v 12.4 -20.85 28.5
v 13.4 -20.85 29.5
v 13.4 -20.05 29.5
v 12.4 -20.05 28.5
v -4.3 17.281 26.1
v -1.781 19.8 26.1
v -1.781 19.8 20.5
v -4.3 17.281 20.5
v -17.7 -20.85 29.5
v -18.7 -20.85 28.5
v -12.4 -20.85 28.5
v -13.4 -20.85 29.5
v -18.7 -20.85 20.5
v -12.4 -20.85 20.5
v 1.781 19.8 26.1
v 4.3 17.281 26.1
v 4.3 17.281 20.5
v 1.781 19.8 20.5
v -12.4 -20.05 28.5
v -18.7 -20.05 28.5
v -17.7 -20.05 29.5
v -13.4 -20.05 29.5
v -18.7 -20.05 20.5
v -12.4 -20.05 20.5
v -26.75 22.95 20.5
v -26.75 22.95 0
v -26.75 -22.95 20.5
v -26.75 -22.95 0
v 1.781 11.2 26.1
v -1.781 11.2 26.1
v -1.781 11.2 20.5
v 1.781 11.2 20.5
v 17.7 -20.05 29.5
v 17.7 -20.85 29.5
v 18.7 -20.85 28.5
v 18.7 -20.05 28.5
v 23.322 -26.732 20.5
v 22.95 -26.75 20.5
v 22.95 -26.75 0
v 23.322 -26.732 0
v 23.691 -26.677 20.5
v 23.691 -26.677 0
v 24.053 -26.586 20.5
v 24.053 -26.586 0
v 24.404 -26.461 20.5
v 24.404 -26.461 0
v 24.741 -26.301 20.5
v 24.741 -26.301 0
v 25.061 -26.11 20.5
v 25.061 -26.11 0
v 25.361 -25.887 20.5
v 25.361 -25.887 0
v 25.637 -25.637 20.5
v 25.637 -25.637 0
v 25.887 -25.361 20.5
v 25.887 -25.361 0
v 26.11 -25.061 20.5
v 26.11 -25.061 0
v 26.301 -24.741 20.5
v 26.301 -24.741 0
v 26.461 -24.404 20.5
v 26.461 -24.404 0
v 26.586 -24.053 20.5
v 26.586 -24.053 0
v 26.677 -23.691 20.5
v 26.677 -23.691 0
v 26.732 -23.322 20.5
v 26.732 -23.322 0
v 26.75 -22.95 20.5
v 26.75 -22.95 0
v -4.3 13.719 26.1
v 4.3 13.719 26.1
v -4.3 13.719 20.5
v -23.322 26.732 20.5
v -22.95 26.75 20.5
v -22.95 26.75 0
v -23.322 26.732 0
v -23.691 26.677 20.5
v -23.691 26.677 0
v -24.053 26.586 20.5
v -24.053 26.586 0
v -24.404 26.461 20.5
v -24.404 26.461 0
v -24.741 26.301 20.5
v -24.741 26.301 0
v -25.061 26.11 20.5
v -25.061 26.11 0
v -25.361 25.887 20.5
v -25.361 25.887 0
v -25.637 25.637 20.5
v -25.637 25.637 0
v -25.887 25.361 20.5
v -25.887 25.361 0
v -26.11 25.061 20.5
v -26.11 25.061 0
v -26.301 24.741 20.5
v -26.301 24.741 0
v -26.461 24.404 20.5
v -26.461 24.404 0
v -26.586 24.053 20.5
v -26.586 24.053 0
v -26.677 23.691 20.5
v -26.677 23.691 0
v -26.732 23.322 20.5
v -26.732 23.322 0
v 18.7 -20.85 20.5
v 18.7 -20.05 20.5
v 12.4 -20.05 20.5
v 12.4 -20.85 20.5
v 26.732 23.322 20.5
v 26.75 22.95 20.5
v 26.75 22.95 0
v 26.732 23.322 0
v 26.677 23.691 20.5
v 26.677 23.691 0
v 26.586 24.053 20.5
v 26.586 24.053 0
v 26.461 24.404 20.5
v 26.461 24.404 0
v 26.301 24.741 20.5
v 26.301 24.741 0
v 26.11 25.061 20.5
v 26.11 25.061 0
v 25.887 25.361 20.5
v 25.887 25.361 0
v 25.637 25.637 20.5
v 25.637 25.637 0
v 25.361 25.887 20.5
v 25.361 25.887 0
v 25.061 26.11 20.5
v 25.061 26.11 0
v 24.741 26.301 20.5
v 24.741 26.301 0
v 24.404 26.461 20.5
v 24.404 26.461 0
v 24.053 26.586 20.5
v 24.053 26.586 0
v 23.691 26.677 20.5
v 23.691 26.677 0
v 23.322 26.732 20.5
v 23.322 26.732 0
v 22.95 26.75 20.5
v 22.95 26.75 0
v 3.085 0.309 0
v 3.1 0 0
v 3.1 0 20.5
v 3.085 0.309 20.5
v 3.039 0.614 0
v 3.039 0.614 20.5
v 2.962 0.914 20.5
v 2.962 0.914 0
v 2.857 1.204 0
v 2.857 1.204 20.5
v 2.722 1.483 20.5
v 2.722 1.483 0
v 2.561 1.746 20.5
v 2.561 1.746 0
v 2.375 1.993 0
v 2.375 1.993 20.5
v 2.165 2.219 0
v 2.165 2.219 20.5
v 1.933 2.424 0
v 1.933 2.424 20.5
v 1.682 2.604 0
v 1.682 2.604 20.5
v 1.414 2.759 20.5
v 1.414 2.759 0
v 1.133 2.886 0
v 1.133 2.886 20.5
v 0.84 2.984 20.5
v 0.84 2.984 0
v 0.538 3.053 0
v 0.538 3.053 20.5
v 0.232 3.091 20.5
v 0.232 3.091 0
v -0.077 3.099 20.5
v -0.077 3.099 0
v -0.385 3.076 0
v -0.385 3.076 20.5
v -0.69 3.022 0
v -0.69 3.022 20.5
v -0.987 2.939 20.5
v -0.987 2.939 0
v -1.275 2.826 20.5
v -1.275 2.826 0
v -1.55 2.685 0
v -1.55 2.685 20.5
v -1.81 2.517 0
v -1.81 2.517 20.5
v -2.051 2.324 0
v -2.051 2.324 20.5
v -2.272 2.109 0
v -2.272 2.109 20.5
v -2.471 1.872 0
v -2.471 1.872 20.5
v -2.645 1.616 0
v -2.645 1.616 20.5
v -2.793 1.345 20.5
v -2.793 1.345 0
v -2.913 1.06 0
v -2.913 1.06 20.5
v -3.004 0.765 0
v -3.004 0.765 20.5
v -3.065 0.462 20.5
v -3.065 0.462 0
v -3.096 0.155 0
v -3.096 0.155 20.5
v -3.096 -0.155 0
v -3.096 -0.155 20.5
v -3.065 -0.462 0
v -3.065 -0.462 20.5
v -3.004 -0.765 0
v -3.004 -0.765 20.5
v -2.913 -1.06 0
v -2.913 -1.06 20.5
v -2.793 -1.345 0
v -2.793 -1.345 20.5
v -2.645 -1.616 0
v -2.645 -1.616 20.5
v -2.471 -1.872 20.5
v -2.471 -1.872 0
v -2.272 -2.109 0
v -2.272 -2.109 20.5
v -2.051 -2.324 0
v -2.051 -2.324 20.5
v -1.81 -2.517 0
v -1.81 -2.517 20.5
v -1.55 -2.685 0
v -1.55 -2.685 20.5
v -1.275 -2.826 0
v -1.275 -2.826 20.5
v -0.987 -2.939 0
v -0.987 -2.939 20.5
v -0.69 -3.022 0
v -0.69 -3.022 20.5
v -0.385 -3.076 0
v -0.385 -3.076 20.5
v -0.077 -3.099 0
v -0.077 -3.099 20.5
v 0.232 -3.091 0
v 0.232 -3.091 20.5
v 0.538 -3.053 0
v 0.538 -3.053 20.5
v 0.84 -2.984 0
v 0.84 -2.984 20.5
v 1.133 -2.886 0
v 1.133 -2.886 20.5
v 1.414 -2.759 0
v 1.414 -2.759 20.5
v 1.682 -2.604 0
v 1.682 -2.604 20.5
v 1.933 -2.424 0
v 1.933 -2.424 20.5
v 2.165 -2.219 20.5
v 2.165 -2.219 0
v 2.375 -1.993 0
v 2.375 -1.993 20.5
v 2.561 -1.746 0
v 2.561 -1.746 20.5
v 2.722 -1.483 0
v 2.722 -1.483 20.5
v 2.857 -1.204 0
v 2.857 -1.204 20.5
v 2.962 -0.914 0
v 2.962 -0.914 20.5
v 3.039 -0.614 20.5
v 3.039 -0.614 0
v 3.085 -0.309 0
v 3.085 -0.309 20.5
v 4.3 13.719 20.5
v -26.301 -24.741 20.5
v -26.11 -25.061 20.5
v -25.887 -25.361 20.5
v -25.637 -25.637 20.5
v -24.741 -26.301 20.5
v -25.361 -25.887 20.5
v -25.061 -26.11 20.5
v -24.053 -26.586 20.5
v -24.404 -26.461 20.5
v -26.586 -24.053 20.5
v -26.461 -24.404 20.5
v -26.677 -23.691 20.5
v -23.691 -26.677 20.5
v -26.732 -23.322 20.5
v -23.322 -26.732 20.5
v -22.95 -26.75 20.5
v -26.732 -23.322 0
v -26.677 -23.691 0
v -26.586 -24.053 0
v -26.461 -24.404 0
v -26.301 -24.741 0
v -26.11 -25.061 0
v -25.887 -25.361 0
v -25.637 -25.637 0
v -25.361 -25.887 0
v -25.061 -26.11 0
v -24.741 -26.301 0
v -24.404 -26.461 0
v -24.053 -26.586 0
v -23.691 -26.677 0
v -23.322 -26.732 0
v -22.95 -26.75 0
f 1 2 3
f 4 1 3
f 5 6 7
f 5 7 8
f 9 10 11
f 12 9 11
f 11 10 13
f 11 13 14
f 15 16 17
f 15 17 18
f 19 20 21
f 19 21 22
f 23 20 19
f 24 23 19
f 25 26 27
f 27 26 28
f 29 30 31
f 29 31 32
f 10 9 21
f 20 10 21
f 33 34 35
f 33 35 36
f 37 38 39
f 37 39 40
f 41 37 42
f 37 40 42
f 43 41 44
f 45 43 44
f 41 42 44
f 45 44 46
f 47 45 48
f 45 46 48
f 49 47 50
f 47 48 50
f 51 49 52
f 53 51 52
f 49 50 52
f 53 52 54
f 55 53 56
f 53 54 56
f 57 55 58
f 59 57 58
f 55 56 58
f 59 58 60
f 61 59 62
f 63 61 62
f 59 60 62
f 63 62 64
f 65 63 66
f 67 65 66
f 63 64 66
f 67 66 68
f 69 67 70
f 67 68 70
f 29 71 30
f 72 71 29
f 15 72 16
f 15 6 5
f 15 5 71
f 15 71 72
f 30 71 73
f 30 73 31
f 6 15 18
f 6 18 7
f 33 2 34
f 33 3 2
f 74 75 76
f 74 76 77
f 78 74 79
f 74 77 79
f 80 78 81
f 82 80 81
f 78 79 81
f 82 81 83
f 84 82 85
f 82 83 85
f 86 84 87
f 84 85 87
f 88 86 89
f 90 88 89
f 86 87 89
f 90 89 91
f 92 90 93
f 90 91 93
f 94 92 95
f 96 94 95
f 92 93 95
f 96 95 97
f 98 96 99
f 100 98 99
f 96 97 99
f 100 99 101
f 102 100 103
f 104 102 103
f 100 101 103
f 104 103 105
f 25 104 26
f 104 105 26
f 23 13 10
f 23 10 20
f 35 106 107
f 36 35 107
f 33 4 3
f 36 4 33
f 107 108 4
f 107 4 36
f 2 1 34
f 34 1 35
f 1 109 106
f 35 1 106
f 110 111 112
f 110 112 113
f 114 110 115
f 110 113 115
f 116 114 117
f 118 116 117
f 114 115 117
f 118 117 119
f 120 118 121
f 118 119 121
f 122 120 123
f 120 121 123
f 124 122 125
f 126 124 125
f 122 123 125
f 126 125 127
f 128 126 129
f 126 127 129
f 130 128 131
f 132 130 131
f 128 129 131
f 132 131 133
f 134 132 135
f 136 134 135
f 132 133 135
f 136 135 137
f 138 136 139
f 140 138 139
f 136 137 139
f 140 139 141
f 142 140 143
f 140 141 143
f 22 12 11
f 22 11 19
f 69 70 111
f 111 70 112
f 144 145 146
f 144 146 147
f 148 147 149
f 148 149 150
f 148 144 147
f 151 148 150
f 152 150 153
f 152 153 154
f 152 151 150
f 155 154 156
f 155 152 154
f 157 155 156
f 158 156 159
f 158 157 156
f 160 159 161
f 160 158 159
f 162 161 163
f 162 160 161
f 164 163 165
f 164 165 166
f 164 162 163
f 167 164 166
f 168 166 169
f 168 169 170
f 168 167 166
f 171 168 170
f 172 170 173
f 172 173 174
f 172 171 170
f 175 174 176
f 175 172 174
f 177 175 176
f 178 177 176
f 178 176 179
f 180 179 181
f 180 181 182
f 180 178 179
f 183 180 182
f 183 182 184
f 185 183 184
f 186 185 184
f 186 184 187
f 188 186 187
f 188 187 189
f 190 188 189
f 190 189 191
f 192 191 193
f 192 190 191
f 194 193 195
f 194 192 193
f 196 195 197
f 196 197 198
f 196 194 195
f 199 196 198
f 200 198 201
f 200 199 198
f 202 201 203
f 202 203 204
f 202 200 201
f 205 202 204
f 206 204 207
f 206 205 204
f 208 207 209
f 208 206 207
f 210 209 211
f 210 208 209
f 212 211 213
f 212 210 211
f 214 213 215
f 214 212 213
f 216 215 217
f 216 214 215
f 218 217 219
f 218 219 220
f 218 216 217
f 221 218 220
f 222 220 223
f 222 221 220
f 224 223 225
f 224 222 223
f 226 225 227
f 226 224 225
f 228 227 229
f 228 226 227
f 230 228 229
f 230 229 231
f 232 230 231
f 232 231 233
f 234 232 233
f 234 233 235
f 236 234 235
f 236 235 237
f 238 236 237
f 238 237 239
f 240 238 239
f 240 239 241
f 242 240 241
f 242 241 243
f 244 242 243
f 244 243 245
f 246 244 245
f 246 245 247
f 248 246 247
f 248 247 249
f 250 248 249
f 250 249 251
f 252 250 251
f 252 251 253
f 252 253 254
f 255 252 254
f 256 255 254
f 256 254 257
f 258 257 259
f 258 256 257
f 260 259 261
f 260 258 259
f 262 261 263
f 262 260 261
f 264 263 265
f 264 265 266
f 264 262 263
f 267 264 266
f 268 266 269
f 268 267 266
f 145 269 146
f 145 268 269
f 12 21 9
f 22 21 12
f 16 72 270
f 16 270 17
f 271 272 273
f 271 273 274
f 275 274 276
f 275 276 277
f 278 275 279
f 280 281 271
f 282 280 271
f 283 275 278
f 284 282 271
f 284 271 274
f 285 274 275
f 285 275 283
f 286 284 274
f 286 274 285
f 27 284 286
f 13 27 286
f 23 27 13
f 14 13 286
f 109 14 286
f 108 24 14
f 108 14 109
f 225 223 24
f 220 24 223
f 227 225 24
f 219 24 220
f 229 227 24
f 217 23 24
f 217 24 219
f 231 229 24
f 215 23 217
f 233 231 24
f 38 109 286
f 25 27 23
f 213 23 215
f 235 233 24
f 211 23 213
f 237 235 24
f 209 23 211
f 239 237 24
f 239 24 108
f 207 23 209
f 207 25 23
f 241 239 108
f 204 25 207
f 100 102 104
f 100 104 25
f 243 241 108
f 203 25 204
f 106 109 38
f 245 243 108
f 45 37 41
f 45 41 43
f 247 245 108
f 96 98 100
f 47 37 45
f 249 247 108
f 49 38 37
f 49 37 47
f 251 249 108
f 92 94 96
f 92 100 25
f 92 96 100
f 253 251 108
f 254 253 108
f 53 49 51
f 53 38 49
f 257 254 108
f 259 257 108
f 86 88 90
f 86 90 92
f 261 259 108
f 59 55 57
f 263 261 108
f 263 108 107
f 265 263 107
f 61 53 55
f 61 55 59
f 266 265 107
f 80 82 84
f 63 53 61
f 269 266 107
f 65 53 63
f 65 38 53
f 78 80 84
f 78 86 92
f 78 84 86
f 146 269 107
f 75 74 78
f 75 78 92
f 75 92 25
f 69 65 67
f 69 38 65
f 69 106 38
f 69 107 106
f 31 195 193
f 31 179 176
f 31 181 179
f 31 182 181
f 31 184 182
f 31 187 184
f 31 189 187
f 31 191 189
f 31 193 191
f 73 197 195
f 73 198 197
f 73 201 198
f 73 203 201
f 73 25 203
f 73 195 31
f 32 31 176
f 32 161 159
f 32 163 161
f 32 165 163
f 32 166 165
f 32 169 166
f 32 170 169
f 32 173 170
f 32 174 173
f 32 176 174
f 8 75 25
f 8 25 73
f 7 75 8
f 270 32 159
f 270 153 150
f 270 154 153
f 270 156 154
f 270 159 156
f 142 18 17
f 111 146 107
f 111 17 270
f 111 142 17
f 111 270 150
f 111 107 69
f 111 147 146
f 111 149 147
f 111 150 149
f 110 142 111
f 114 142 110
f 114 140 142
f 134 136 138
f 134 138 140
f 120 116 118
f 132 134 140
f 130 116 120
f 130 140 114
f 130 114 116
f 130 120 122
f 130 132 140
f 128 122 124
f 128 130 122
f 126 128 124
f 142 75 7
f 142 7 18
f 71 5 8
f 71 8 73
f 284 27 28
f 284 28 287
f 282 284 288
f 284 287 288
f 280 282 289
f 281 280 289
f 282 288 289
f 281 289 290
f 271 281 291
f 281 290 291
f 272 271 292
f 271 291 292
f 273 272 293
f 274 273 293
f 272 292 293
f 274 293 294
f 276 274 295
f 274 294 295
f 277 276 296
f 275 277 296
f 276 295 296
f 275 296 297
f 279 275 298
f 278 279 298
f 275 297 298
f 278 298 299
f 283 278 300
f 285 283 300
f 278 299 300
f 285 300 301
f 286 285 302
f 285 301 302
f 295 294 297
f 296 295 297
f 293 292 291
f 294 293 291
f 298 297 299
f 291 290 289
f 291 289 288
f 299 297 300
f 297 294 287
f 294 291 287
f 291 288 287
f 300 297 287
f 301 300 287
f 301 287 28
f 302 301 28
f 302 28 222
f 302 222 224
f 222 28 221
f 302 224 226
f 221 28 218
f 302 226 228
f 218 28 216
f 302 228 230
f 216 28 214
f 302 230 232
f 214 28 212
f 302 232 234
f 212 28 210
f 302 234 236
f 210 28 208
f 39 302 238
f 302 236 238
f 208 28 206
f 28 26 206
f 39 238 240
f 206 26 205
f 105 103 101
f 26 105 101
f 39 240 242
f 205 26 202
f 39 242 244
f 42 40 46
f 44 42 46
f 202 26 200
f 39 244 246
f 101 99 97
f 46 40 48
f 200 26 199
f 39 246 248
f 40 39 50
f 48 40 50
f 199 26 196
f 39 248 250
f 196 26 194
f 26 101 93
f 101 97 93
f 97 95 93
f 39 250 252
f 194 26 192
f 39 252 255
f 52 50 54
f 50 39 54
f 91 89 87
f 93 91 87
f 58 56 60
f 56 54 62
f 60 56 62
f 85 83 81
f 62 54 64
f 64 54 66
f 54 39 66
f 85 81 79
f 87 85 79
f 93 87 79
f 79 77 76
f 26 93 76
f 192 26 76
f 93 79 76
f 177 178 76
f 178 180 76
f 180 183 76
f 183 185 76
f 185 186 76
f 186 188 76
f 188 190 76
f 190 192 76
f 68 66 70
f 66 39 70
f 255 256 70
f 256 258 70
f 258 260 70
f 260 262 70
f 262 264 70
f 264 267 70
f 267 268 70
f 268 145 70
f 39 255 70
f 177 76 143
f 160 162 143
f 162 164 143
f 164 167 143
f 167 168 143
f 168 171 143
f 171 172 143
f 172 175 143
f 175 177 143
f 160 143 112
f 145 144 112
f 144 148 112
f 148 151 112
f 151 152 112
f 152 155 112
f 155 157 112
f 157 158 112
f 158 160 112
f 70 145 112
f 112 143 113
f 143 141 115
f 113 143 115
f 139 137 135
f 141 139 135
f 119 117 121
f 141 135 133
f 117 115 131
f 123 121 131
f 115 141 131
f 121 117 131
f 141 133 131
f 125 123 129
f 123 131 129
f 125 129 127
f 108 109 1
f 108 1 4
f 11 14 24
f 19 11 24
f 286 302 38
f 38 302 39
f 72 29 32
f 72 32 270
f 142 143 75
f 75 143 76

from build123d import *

# Parameters (mm, degrees)
F0_R     = 3.1
F1_DEPTH = 20.5
F3_DEPTH = 5.6
F4_W     = 6.3
F4_H     = 0.8
F5_DEPTH = 9
F6_SIZE  = 1


with BuildPart() as f1:
    # F0 (on Top) → F1 (new body)
    with BuildSketch(Plane.XY):
        with BuildLine():
            Line((-22.95, -26.75), (22.95, -26.75))
            ThreePointArc((22.95, -26.75), (25.637006, -25.637006), (26.75, -22.95))
            Line((26.75, -22.95), (26.75, 22.95))
            ThreePointArc((26.75, 22.95), (25.637006, 25.637006), (22.95, 26.75))
            Line((22.95, 26.75), (-22.95, 26.75))
            ThreePointArc((-22.95, 26.75), (-25.637006, 25.637006), (-26.75, 22.95))
            Line((-26.75, 22.95), (-26.75, -22.95))
            ThreePointArc((-26.75, -22.95), (-25.637006, -25.637006), (-22.95, -26.75))
        make_face()
        Circle(F0_R, mode=Mode.SUBTRACT)
    extrude(amount=F1_DEPTH)

    # F2 (on face) → F3 (join)
    with BuildSketch(Plane.XY.offset(20.5)):
        Polygon((4.3, 13.718882), (4.3, 17.281118), (1.781118, 19.8), (-1.781118, 19.8), (-4.3, 17.281118), (-4.3, 13.718882), (-1.781118, 11.2), (1.781118, 11.2), align=None)
    extrude(amount=F3_DEPTH)

    # F4 (on face) → F5 (join)
    with BuildSketch(Plane.XY.offset(20.5)):
        with Locations((-15.55, -20.45)):
            Rectangle(F4_W, F4_H)
        with Locations((15.55, -20.45)):
            Rectangle(F4_W, F4_H)
    extrude(amount=F5_DEPTH)

    # F6
    f6_edges = [f1.edges().sort_by_distance(p)[0] for p in [
        (-18.7, -20.45, 29.5),
        (-12.4, -20.45, 29.5),
        (12.4, -20.45, 29.5),
        (18.7, -20.45, 29.5),
    ]]
    chamfer(f6_edges, length=F6_SIZE)


solid = f1.part
